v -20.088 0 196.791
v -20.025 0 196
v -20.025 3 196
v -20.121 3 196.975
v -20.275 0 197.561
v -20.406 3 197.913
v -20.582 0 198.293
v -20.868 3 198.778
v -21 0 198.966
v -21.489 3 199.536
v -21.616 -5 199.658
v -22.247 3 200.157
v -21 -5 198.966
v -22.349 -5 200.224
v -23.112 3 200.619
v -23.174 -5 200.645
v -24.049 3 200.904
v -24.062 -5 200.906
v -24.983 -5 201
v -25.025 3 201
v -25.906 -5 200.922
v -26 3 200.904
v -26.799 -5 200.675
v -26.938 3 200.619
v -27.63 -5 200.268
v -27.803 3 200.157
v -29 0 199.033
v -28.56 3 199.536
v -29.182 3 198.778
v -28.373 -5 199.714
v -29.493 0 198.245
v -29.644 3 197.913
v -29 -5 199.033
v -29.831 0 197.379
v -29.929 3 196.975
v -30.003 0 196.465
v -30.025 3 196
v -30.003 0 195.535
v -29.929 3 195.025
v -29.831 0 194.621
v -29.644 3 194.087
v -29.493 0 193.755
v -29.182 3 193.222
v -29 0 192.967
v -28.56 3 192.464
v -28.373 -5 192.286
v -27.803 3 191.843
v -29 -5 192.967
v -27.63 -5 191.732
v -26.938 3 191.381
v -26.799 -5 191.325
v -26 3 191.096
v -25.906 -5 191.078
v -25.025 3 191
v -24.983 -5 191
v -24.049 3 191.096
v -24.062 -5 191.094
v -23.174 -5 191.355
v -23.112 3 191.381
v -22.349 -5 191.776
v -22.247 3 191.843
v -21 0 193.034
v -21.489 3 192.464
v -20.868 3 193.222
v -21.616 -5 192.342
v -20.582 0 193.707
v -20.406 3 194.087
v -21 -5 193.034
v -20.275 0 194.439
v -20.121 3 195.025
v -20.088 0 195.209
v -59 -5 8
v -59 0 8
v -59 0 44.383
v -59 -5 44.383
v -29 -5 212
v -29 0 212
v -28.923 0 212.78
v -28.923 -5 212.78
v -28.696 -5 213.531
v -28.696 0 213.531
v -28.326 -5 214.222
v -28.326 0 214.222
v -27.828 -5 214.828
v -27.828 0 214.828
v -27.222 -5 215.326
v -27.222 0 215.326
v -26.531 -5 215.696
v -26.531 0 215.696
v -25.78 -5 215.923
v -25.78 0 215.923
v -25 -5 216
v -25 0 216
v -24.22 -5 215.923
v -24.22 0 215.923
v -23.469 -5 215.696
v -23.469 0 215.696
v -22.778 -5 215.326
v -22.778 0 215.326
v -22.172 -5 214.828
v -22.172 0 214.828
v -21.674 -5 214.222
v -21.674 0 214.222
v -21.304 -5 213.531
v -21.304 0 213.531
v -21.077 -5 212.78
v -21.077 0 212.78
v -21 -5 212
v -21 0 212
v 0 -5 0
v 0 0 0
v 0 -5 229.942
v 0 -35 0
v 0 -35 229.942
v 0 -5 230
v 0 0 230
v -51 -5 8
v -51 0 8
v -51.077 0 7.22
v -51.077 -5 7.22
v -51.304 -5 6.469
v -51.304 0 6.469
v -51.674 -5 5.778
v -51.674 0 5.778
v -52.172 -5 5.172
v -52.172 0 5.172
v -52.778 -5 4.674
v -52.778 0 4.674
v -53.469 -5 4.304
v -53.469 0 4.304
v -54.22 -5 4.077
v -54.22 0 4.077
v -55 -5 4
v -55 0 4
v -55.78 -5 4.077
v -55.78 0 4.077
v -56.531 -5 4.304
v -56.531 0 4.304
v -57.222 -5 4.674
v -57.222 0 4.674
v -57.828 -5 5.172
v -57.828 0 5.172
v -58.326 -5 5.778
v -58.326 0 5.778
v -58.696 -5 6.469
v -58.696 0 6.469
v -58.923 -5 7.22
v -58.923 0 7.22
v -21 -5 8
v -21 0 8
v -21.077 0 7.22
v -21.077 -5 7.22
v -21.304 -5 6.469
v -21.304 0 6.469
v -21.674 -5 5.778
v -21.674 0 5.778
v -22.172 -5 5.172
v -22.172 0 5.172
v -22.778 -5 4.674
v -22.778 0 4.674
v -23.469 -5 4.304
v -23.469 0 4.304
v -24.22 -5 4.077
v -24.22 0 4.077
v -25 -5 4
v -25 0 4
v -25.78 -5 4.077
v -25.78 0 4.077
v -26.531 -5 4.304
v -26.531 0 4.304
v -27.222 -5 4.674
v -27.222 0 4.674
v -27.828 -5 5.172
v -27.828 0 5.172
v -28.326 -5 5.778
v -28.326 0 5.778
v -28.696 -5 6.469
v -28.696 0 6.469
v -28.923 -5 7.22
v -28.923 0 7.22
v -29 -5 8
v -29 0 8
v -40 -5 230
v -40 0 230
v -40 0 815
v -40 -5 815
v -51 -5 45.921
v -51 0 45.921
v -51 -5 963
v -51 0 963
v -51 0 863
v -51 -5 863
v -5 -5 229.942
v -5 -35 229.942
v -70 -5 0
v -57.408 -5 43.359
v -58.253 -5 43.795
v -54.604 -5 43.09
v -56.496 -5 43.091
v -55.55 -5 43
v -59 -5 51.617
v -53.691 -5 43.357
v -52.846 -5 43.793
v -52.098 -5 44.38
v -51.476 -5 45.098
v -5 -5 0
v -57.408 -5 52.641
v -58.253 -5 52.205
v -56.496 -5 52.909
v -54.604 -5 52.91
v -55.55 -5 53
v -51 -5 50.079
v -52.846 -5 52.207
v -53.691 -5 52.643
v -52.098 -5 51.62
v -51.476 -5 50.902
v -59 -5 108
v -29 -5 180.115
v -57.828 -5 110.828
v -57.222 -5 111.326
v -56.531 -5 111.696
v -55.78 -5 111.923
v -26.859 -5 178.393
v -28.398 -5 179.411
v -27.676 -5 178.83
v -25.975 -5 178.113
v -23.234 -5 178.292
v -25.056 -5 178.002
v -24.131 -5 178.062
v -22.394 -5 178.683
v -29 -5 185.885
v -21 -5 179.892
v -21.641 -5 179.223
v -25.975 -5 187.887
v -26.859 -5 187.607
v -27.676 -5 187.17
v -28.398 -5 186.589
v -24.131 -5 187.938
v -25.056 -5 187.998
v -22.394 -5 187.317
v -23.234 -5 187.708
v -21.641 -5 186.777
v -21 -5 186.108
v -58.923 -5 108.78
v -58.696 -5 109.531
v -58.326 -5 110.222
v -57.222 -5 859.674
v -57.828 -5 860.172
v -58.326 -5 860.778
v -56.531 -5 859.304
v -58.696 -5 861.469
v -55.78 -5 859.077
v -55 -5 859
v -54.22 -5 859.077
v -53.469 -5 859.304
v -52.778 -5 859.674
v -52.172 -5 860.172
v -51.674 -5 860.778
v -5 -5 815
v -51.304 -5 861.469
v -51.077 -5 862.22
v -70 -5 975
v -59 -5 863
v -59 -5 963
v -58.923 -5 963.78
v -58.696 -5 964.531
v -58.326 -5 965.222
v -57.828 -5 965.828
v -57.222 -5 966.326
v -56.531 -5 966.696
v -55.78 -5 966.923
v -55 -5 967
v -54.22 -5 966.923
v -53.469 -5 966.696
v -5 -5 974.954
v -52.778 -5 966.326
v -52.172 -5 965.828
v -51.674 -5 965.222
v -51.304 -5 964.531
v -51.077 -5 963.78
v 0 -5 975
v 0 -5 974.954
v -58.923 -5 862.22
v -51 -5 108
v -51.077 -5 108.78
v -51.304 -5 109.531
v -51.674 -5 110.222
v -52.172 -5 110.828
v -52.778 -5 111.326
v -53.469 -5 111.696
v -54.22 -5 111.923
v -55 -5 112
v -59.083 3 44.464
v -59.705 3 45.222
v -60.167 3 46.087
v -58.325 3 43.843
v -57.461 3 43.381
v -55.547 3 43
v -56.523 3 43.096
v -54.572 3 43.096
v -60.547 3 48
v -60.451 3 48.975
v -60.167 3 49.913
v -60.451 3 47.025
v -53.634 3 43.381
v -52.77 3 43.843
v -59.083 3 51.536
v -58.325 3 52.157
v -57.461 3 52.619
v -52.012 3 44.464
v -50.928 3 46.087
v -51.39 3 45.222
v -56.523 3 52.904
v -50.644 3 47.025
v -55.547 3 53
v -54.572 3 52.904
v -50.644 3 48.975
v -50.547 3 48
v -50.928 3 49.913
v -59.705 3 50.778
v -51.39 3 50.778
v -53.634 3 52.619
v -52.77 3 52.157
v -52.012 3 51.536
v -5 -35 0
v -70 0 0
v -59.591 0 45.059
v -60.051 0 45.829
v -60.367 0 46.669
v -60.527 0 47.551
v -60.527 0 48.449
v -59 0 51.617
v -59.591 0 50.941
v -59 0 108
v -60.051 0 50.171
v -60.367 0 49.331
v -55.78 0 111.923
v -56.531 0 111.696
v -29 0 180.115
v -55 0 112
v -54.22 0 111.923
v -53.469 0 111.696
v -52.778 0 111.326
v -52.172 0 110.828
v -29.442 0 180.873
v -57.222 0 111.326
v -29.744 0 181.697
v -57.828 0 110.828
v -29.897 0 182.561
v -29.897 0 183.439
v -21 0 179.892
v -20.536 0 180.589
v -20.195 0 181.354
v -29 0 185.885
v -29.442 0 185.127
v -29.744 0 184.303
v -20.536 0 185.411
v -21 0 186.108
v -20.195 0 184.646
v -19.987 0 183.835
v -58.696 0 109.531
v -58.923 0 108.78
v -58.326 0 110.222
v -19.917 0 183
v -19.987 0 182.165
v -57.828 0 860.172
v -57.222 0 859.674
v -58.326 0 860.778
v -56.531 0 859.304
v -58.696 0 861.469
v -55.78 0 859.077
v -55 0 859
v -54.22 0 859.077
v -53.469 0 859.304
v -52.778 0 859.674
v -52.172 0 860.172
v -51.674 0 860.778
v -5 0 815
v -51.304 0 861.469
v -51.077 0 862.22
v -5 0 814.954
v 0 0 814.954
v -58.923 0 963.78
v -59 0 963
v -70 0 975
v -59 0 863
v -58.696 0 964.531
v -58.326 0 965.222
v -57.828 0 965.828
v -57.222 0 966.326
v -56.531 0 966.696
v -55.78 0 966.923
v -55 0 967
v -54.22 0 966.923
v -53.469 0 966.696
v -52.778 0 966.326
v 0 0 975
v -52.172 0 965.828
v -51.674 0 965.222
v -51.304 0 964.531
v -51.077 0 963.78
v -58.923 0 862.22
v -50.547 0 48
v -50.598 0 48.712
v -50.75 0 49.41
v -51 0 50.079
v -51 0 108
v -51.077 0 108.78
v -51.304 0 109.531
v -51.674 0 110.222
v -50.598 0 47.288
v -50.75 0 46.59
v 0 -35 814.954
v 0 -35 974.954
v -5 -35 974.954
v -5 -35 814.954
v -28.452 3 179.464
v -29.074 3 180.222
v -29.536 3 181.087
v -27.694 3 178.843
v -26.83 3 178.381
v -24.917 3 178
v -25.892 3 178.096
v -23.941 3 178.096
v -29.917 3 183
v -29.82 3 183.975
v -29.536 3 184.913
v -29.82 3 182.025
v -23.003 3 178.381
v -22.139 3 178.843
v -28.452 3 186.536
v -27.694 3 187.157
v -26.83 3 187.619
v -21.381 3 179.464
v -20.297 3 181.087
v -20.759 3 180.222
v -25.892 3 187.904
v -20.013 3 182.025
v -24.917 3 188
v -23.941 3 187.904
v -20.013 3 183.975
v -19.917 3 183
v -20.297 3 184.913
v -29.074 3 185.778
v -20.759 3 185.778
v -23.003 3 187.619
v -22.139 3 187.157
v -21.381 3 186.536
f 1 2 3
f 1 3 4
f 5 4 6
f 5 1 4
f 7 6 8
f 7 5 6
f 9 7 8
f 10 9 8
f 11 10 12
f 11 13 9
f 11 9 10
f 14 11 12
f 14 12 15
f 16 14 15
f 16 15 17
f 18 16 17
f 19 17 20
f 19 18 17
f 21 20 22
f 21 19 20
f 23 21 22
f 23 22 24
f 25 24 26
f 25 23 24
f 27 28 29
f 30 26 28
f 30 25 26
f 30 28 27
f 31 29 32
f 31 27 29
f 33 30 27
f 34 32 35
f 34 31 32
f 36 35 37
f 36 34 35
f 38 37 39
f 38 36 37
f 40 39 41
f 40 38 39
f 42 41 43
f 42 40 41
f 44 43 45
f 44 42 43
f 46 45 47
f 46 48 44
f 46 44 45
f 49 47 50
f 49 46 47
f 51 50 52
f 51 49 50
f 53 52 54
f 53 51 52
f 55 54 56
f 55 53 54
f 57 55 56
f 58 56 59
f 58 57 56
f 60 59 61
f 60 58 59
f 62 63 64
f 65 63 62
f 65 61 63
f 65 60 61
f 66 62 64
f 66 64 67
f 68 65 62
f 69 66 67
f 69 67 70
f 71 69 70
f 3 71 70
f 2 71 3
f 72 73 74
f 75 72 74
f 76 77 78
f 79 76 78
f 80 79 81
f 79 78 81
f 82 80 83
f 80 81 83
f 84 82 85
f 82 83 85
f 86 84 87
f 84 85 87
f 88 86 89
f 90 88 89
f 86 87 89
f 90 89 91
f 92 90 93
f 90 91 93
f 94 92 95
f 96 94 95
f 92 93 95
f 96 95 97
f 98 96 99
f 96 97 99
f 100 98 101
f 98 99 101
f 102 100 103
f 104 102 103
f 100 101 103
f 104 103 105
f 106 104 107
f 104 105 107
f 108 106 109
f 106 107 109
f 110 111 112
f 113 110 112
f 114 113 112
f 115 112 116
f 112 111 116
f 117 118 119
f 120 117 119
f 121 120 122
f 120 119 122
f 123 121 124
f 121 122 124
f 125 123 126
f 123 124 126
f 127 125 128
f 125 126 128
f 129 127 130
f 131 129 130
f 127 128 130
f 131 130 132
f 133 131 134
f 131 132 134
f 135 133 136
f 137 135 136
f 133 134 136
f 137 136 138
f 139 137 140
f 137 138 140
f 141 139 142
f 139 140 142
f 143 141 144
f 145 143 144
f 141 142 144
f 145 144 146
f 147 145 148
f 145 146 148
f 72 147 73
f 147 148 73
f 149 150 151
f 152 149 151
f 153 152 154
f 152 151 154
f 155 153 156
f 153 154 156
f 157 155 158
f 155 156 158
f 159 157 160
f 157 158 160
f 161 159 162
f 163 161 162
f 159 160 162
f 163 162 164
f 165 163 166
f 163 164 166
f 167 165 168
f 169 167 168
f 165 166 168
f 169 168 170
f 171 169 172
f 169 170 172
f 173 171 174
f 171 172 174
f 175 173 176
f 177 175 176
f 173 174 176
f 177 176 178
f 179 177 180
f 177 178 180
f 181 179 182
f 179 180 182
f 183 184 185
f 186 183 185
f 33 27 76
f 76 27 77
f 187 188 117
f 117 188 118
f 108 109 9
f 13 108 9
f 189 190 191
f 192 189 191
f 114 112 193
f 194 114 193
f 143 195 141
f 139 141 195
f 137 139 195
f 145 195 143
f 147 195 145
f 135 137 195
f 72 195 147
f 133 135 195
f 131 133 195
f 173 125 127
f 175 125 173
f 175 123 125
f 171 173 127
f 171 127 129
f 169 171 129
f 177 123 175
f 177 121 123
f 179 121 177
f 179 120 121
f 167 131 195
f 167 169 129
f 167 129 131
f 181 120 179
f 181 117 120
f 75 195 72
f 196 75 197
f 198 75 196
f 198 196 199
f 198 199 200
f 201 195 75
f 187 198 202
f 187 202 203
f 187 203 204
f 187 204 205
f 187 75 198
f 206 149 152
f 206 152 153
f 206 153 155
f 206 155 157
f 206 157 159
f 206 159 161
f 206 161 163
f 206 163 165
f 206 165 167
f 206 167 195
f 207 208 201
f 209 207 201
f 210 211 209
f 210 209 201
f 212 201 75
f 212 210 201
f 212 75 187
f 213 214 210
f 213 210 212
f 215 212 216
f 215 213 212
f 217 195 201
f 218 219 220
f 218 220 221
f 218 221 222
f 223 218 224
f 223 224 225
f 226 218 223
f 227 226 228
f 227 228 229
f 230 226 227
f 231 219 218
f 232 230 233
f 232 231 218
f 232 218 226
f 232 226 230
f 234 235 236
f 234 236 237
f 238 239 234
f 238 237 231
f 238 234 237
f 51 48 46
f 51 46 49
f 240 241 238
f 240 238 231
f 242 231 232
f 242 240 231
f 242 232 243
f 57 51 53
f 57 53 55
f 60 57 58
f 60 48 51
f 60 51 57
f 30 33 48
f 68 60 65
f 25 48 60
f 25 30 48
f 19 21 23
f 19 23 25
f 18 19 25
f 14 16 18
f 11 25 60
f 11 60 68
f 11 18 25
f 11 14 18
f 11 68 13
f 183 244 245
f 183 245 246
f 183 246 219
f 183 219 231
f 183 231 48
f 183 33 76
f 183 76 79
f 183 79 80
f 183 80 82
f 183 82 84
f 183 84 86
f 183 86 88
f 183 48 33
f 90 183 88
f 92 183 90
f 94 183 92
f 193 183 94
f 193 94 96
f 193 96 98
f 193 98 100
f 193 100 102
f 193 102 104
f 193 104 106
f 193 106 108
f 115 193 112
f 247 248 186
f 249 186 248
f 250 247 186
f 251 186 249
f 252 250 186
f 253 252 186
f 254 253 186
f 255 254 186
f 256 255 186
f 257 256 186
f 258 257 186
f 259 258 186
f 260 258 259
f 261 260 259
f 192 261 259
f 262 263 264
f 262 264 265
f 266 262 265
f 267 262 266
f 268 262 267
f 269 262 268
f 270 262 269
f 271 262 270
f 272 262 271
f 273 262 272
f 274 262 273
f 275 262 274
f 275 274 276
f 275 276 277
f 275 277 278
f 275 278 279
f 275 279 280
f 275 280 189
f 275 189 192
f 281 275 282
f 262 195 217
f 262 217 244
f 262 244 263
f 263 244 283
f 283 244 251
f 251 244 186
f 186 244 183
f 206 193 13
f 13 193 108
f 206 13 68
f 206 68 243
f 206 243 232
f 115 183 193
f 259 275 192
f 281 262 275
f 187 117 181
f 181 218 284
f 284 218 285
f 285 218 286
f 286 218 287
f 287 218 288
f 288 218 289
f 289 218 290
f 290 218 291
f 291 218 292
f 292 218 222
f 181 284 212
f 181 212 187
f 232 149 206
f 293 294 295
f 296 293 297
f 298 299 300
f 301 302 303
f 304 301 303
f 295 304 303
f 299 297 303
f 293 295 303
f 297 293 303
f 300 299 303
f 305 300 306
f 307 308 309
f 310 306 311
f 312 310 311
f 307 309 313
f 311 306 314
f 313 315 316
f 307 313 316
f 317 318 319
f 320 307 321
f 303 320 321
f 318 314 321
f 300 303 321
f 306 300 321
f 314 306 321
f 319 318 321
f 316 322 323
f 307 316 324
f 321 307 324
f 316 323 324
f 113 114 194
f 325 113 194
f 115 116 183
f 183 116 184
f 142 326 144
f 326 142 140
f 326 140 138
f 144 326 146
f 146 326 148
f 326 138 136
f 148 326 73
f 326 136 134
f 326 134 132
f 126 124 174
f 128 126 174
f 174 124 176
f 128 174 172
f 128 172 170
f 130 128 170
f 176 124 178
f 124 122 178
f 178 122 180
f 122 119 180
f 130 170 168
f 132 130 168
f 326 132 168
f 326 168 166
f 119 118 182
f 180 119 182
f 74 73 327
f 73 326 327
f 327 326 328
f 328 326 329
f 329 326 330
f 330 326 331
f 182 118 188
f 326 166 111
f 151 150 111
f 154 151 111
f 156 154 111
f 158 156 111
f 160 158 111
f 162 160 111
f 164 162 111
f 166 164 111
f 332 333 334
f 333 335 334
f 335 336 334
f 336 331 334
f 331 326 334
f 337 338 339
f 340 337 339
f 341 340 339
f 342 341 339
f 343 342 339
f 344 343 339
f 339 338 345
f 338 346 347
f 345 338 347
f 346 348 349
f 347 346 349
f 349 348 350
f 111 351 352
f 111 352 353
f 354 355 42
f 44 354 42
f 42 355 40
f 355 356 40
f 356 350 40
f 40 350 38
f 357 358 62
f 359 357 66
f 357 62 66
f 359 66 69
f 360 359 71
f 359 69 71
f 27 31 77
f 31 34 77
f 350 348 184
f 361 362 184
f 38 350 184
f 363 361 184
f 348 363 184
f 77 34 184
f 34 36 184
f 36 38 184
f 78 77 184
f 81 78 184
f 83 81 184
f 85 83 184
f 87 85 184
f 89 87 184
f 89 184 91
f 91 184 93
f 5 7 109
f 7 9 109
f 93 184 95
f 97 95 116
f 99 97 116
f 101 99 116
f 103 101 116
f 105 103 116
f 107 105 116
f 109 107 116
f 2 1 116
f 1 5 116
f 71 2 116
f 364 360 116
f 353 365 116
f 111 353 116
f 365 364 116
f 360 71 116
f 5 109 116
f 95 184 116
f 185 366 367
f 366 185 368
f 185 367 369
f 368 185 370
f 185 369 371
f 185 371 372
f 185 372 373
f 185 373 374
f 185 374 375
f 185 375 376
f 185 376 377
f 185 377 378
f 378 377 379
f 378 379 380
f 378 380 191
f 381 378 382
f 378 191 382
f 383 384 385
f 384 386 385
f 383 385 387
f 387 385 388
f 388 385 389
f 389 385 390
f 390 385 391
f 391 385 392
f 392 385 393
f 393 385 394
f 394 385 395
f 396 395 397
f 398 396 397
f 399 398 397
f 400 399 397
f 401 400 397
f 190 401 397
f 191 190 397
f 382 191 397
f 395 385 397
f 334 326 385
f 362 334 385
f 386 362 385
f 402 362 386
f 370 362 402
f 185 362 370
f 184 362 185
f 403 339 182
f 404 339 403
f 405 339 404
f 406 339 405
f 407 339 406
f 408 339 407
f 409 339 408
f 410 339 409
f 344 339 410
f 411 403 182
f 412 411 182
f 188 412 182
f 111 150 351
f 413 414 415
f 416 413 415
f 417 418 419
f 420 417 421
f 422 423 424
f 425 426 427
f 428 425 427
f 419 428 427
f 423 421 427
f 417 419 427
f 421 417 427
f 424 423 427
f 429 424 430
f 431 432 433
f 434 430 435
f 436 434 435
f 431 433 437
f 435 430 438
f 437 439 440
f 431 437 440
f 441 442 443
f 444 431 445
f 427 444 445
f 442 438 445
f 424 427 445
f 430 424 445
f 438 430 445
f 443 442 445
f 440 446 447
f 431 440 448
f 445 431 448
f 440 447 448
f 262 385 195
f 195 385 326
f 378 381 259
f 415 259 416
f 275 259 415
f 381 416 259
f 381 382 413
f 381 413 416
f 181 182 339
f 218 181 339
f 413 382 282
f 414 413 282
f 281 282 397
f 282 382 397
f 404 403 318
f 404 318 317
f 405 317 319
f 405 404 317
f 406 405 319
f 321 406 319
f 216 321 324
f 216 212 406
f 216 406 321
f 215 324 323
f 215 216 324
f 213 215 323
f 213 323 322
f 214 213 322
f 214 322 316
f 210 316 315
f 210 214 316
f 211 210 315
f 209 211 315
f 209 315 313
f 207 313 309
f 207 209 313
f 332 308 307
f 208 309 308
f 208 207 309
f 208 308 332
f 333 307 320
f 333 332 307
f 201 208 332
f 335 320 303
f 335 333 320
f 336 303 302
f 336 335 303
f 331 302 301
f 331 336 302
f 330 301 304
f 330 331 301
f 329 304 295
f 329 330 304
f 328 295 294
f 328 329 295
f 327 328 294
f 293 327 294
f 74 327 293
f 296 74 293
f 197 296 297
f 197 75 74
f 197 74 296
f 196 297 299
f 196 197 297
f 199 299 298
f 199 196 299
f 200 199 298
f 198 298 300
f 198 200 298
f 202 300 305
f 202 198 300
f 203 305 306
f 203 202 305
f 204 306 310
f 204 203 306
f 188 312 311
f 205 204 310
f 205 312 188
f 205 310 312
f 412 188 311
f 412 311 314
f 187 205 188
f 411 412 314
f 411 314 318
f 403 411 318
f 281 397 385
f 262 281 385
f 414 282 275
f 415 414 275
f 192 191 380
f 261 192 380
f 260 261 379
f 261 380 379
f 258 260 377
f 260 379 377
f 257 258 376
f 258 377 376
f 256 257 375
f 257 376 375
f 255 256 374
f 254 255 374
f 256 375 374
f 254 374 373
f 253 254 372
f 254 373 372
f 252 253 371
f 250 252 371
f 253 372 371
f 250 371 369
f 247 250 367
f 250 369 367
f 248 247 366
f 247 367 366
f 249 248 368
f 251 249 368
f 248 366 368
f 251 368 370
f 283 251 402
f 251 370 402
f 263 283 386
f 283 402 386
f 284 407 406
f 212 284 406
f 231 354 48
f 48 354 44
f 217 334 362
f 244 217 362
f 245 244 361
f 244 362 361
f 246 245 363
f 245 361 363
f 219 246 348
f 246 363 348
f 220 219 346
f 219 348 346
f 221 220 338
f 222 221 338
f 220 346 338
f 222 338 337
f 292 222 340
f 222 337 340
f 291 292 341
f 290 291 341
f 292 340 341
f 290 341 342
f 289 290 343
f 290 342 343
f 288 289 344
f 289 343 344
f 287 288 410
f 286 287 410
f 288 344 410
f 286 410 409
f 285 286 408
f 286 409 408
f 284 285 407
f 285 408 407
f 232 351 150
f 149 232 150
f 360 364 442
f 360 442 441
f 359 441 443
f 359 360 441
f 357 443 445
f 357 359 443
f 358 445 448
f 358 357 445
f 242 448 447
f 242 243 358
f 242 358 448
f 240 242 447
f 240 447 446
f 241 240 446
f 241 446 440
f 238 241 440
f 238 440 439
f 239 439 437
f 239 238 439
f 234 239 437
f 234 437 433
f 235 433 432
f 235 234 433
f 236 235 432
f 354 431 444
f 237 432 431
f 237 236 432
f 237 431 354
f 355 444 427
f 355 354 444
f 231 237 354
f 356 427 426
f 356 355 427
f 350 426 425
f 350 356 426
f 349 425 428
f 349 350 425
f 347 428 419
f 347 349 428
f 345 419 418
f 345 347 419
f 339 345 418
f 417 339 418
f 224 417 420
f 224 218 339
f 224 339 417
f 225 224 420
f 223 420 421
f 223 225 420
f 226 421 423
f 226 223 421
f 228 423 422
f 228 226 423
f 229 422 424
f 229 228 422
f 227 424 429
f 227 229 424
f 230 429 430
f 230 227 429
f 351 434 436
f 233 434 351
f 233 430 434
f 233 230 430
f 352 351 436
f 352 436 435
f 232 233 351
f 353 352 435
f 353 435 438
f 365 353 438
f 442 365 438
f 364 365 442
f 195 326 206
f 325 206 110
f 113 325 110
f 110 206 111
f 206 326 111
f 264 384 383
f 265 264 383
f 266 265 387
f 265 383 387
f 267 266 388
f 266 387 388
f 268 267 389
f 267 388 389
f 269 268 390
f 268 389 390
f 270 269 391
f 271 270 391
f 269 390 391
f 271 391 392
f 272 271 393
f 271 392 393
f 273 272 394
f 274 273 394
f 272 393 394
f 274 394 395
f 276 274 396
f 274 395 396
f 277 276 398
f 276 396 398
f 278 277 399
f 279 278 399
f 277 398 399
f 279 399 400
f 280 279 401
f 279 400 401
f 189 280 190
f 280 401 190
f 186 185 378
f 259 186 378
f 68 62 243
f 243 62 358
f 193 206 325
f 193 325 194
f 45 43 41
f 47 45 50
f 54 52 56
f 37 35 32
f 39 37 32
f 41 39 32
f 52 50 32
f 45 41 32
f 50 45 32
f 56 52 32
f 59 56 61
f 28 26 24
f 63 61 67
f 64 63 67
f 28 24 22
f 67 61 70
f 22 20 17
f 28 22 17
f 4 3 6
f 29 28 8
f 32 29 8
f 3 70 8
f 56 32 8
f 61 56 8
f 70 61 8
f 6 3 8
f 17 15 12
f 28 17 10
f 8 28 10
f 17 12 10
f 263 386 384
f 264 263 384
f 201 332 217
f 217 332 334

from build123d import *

# Parameters (mm, degrees)
F1_DEPTH = 5
F3_W     = 5
F3_H     = 229.9418896437
F3_H_2   = 160
F4_DEPTH = 35
F6_R     = 5
F7_DEPTH = 8


with BuildPart() as f1:
    # F0 (on Front) → F1 (new body)
    with BuildSketch(Plane.XZ):
        Polygon((-70, 0), (0, 0), (0, 230), (-40, 230), (-40, 815), (0, 815), (0, 975), (-70, 975), align=None)
        with BuildLine():
            ThreePointArc((-59, 108), (-55, 112), (-51, 108))
            Line((-51, 108), (-51, 8))
            ThreePointArc((-51, 8), (-55, 4), (-59, 8))
            Line((-59, 8), (-59, 108))
        make_face(mode=Mode.SUBTRACT)
        with BuildLine():
            ThreePointArc((-29, 212), (-25, 216), (-21, 212))
            Line((-21, 212), (-21, 8))
            ThreePointArc((-21, 8), (-25, 4), (-29, 8))
            Line((-29, 8), (-29, 212))
        make_face(mode=Mode.SUBTRACT)
        with BuildLine():
            ThreePointArc((-59, 963), (-55, 967), (-51, 963))
            Line((-51, 963), (-51, 863))
            ThreePointArc((-51, 863), (-55, 859), (-59, 863))
            Line((-59, 863), (-59, 963))
        make_face(mode=Mode.SUBTRACT)
    extrude(amount=F1_DEPTH)

    # F3 (on offset) → F4 (join)
    with BuildSketch(Plane(origin=(0, 0, 0), x_dir=(-1, 0, 0), z_dir=(0, 1, 0))):
        with Locations((2.5, 114.9709448218)):
            Rectangle(F3_W, F3_H)
        with Locations((2.5, 894.9537706375)):
            Rectangle(F3_W, F3_H_2)
    extrude(amount=-F4_DEPTH)

    # F6 (on offset) → F7 (join)
    with BuildSketch(Plane.XZ.offset(5)):
        with Locations((-55.5474348366, 48)):
            Circle(F6_R)
        with Locations((-24.9165232928, 183)):
            Circle(F6_R)
        with Locations((-25.0249505043, 196)):
            Circle(F6_R)
    extrude(amount=-F7_DEPTH)


solid = f1.part
